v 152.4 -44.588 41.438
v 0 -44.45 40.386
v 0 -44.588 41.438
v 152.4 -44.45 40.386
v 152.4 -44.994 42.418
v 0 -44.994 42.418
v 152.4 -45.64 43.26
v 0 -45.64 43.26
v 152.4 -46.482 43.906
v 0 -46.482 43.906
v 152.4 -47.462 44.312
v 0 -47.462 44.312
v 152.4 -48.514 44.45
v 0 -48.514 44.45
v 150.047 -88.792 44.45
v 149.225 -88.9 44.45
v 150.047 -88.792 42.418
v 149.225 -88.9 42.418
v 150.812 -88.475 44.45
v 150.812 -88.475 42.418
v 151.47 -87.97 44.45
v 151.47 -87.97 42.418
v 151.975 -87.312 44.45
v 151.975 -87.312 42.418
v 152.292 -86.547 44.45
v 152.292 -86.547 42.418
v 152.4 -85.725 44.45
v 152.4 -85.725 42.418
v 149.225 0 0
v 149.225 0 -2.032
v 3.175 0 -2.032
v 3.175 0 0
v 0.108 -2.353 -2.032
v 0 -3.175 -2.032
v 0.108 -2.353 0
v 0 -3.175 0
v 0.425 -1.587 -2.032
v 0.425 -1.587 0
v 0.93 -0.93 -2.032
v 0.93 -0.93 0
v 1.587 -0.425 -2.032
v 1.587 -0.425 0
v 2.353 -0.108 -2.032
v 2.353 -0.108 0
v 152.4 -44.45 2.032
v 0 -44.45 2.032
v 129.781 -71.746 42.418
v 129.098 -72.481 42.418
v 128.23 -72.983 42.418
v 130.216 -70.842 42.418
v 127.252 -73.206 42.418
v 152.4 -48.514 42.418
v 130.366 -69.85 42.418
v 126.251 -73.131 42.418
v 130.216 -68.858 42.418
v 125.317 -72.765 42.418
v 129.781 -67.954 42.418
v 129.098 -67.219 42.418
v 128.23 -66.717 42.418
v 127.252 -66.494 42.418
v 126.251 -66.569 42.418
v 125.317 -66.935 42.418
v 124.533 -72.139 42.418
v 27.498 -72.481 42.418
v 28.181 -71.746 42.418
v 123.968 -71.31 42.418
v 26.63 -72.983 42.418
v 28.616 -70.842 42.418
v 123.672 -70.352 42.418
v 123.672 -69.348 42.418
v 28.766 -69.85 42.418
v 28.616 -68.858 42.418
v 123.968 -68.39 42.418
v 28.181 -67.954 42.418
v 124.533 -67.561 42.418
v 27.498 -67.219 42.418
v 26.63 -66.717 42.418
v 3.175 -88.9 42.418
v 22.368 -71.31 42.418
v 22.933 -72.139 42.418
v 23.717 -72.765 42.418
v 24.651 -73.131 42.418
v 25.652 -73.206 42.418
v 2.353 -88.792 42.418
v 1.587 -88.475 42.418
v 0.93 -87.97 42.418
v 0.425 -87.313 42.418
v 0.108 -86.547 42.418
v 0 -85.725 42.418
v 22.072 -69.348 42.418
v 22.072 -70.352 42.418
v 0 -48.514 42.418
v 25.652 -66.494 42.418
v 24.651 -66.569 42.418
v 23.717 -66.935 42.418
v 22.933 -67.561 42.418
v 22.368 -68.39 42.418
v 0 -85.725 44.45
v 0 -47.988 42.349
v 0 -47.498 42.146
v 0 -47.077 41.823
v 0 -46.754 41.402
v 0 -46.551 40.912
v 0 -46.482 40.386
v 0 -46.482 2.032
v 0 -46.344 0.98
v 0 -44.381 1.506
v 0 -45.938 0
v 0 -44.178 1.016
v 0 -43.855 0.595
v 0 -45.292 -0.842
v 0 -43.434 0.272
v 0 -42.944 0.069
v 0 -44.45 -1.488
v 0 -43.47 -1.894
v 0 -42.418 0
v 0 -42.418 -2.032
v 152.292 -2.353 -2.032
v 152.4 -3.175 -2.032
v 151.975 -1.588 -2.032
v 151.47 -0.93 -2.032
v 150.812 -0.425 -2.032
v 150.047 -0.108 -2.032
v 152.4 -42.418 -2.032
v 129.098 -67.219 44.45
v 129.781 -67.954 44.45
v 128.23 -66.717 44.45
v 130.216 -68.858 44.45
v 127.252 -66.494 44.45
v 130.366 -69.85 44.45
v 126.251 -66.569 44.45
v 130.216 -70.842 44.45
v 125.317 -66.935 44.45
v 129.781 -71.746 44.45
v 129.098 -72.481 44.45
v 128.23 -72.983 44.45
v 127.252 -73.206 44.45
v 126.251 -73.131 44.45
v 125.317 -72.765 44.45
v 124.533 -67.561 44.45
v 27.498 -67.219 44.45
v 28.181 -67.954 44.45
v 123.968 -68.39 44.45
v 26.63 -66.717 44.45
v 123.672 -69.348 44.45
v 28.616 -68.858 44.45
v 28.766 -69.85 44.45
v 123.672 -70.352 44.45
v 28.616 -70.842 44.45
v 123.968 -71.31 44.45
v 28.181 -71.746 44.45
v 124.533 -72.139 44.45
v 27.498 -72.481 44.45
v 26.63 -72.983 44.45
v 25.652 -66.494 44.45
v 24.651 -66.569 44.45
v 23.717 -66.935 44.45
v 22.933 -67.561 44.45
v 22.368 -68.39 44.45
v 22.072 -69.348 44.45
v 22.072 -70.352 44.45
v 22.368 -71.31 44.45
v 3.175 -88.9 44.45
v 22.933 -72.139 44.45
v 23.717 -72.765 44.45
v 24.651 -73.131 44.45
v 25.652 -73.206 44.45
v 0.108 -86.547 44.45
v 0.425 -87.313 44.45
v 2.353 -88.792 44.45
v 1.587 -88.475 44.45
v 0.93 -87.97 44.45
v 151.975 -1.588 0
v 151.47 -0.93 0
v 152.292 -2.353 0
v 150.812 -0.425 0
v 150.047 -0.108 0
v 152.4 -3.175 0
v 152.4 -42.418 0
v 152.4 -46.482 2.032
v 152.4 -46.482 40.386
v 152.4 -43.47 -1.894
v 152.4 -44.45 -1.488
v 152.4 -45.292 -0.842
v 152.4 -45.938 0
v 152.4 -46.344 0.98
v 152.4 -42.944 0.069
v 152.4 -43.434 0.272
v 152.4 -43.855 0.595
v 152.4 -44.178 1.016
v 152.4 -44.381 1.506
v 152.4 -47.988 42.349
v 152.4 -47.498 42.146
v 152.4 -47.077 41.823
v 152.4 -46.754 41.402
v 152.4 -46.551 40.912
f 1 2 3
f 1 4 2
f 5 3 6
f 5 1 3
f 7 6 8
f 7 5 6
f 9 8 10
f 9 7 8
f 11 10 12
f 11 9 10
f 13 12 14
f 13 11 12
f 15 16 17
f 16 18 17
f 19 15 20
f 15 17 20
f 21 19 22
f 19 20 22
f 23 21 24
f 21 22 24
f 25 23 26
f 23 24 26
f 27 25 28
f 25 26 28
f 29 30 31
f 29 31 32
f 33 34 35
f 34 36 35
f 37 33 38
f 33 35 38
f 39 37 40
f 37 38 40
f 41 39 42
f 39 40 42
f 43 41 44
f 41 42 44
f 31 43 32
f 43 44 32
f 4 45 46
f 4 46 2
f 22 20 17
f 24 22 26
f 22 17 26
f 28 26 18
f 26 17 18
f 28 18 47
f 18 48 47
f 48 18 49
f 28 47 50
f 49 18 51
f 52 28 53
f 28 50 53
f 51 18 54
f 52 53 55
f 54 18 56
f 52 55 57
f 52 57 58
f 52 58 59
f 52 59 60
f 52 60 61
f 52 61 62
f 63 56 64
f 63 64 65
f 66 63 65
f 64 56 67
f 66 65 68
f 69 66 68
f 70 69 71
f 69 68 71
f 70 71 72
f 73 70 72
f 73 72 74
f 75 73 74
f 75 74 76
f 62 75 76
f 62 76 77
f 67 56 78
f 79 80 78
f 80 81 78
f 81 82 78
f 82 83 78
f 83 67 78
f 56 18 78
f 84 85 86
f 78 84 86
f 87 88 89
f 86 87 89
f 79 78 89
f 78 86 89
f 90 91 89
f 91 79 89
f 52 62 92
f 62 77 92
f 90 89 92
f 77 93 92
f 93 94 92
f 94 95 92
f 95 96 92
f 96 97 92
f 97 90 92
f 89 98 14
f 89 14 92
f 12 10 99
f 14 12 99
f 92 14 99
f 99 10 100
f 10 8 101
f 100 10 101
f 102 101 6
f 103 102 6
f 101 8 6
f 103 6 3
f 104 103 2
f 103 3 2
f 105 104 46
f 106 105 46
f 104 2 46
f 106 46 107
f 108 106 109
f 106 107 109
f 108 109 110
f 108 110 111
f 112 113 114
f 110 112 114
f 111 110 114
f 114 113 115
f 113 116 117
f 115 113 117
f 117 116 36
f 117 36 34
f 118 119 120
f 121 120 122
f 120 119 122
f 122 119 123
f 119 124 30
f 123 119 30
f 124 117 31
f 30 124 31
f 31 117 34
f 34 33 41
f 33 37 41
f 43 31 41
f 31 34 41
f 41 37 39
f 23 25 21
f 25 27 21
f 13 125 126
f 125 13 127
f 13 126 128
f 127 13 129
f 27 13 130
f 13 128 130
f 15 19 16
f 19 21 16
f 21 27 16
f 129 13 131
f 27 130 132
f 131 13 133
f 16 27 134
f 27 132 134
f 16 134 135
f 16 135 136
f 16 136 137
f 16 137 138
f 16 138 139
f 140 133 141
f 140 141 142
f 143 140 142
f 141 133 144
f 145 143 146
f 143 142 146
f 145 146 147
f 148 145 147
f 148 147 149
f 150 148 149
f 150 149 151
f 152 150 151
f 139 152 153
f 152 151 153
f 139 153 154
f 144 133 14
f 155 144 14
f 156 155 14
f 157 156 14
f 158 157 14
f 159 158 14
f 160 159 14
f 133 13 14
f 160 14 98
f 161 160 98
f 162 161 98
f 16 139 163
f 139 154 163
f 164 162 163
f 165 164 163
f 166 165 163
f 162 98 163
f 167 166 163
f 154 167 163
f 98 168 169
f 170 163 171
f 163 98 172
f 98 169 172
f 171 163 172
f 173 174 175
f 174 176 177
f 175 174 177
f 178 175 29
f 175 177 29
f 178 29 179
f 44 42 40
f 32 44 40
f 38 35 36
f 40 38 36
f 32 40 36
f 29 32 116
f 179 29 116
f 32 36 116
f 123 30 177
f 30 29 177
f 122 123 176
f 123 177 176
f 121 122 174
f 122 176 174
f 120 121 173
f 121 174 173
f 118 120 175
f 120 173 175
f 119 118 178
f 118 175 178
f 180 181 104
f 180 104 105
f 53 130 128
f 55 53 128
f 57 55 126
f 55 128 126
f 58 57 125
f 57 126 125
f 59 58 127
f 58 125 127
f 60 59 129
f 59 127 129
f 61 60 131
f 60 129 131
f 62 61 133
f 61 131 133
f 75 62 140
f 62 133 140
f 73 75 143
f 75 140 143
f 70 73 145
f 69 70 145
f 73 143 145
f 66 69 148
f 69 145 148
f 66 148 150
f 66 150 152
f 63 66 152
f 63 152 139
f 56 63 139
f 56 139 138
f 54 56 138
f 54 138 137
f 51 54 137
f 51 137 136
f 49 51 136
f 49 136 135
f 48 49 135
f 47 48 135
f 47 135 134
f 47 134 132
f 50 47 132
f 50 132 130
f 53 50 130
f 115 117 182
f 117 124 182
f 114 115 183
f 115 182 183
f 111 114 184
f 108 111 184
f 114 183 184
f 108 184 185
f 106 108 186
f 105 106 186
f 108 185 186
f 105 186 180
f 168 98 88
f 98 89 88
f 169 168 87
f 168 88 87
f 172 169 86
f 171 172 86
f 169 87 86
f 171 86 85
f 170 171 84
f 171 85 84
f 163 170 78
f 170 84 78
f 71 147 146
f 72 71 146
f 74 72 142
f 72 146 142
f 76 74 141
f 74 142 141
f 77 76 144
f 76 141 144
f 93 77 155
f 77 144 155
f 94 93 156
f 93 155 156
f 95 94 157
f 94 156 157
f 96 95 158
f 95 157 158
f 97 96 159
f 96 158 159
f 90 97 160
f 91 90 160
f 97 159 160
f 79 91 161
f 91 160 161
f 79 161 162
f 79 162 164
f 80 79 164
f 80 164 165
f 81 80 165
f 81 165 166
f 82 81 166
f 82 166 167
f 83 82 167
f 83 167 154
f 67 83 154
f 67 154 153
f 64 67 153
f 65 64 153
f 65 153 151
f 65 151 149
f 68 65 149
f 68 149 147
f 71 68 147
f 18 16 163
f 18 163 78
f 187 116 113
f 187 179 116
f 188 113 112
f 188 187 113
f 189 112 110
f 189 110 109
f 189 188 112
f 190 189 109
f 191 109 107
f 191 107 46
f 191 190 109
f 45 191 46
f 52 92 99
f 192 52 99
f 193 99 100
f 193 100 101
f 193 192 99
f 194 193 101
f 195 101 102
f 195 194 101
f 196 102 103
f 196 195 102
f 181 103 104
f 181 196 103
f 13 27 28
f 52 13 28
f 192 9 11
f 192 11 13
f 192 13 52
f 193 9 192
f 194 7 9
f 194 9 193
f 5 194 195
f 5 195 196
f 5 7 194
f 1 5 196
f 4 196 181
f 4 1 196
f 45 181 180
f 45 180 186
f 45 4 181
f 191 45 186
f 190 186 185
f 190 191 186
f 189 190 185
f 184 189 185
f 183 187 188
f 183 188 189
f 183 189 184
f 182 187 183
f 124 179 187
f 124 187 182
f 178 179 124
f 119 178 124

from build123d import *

# Parameters (mm, degrees)
BOSS_EXTRUDE1_DEPTH = 152.4
FILLET1_R           = 2.032
FILLET2_R           = 4.064
FILLET3_R           = 3.175
SKETCH2_R           = 3.3655
CUT_EXTRUDE1_DEPTH  = 47.482


with BuildPart() as part:
    # Sketch1 → Boss-Extrude1 (new body)
    with BuildSketch(Plane(origin=(0, 0, 0), x_dir=(0, 0, -1), z_dir=(1, 0, 0))):
        Polygon((0, 0), (0, -44.45), (-44.45, -44.45), (-44.45, -88.9), (-42.418, -88.9), (-42.418, -46.482), (2.032, -46.482), (2.032, 0), align=None)
    extrude(amount=BOSS_EXTRUDE1_DEPTH)

    # Fillet1
    fillet1_edges = [part.edges().sort_by_distance(p)[0] for p in [
        (76.2, -46.482, 42.418),
        (76.2, -44.45, 0),
    ]]
    fillet(fillet1_edges, radius=FILLET1_R)

    # Fillet2
    fillet2_edges = [part.edges().sort_by_distance(p)[0] for p in [
        (76.2, -46.482, -2.032),
        (76.2, -44.45, 44.45),
    ]]
    fillet(fillet2_edges, radius=FILLET2_R)

    # Fillet3
    fillet3_edges = [part.edges().sort_by_distance(p)[0] for p in [
        (0, 0, -1.016),
        (152.4, -88.9, 43.434),
        (152.4, 0, -1.016),
        (0, -88.9, 43.434),
    ]]
    fillet(fillet3_edges, radius=FILLET3_R)

    # Sketch2 → Cut-Extrude1 (cut, through all)
    with BuildSketch(Plane.XY.offset(44.45)):
        with Locations((25.4, -69.85)):
            Circle(SKETCH2_R)
        with Locations((127, -69.85)):
            Circle(SKETCH2_R)
    extrude(amount=-CUT_EXTRUDE1_DEPTH, mode=Mode.SUBTRACT)


solid = part.part
